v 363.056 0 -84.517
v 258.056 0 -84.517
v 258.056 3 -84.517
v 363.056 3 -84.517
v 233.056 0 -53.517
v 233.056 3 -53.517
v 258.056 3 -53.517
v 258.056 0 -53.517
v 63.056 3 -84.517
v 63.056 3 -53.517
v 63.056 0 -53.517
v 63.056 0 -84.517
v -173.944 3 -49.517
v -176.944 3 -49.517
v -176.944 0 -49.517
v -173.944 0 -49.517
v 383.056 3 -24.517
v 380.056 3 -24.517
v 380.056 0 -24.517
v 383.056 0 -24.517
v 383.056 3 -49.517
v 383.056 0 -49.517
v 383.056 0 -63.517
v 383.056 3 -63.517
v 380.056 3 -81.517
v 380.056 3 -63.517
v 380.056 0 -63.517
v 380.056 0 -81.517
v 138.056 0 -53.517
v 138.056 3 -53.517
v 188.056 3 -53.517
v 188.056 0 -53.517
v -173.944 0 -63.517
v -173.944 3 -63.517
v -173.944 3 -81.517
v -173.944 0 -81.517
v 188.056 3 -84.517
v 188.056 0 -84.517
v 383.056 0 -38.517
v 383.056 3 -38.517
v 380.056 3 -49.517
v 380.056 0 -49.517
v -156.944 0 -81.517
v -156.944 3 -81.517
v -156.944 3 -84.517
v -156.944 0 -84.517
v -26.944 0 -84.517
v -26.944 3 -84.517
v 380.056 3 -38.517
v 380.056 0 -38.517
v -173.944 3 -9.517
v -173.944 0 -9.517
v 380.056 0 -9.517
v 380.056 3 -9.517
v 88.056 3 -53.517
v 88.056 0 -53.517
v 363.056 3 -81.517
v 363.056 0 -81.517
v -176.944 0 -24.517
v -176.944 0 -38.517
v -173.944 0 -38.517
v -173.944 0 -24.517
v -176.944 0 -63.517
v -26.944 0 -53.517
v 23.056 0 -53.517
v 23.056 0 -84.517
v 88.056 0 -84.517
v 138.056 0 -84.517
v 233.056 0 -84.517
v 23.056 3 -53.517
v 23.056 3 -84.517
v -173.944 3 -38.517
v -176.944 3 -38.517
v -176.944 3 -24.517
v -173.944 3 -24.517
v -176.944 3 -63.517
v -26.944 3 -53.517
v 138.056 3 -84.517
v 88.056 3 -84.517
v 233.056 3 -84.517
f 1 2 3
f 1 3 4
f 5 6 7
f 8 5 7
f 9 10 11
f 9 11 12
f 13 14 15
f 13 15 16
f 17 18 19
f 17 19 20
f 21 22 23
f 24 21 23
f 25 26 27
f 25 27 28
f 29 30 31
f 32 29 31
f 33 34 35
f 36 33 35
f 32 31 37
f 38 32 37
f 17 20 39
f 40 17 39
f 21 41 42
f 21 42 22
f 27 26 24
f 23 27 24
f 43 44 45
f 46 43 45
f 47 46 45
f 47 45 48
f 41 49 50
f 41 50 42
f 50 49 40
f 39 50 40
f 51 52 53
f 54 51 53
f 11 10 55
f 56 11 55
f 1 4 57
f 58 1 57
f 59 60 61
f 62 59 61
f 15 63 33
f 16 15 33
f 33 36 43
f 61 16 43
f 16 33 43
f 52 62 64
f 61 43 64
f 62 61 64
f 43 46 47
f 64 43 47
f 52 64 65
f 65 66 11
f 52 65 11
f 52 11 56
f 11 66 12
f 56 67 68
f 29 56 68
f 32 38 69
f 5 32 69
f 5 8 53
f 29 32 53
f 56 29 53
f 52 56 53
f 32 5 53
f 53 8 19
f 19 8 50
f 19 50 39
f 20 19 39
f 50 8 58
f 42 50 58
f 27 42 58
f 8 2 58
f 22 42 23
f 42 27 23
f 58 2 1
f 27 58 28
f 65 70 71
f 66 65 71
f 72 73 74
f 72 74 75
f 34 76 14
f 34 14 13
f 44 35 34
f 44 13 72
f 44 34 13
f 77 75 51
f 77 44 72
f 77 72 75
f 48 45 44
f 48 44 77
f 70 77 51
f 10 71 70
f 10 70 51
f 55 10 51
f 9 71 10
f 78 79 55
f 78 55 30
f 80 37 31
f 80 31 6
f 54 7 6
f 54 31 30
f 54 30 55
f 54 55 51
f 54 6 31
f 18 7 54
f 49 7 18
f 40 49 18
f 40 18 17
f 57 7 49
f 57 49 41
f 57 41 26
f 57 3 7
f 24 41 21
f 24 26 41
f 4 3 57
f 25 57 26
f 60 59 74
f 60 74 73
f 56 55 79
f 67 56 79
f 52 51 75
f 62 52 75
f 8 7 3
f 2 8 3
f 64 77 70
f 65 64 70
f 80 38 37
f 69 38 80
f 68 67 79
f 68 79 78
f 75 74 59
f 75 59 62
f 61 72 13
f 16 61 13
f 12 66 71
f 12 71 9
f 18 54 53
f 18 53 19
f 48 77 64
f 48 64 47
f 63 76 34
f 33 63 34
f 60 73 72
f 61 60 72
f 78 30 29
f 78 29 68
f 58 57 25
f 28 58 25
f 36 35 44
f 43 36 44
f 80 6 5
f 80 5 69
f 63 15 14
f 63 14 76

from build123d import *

# Parameters (mm, degrees)
SKETCH1_W           = 560
SKETCH1_H           = 75
BOSS_EXTRUDE1_DEPTH = 3
SKETCH2_W           = 50
SKETCH2_H           = 31
SKETCH2_W_2         = 25
CUT_EXTRUDE2_DEPTH  = 3
SKETCH3_W           = 20
SKETCH3_H           = 3
CUT_EXTRUDE3_DEPTH  = 3
SKETCH7_W           = 3
SKETCH7_H           = 15
SKETCH7_H_2         = 11
SKETCH7_H_3         = 18
CUT_EXTRUDE8_DEPTH  = 10


with BuildPart() as part:
    # Sketch1 → Boss-Extrude1 (new body)
    with BuildSketch(Plane(origin=(0, 0, 0), x_dir=(1, 0, 0), z_dir=(0, 1, 0))):
        with Locations((103.055832565, 47.017453799)):
            Rectangle(SKETCH1_W, SKETCH1_H)
    extrude(amount=BOSS_EXTRUDE1_DEPTH)

    # Sketch2 → Cut-Extrude2 (cut)
    with BuildSketch(Plane(origin=(0, 3, 0), x_dir=(1, 0, 0), z_dir=(0, 1, 0))):
        with Locations((-1.944167435, 69.017453799)):
            Rectangle(SKETCH2_W, SKETCH2_H)
        with Locations((75.555832565, 69.017453799)):
            Rectangle(SKETCH2_W_2, SKETCH2_H)
        with Locations((163.055832565, 69.017453799)):
            Rectangle(SKETCH2_W, SKETCH2_H)
        with Locations((245.555832565, 69.017453799)):
            Rectangle(SKETCH2_W_2, SKETCH2_H)
    extrude(amount=-CUT_EXTRUDE2_DEPTH, mode=Mode.SUBTRACT)

    # Sketch3 → Cut-Extrude3 (cut)
    with BuildSketch(Plane(origin=(0, 3, 0), x_dir=(1, 0, 0), z_dir=(0, 1, 0))):
        with Locations((-166.944167435, 83.017453799)):
            Rectangle(SKETCH3_W, SKETCH3_H)
    extrude(amount=-CUT_EXTRUDE3_DEPTH, mode=Mode.SUBTRACT)

    # Sketch7 → Cut-Extrude8 (cut)
    with BuildSketch(Plane(origin=(0, 3, 0), x_dir=(1, 0, 0), z_dir=(0, 1, 0))):
        with Locations((-175.444167435, 17.017453799)):
            Rectangle(SKETCH7_W, SKETCH7_H)
        with Locations((-175.444167435, 44.017453799)):
            Rectangle(SKETCH7_W, SKETCH7_H_2)
        with Locations((-175.444167435, 72.517453799)):
            Rectangle(SKETCH7_W, SKETCH7_H_3)
        with Locations((381.555832565, 17.017453799)):
            Rectangle(SKETCH7_W, SKETCH7_H)
        with Locations((381.555832565, 44.017453799)):
            Rectangle(SKETCH7_W, SKETCH7_H_2)
        with Locations((381.555832565, 72.517453799)):
            Rectangle(SKETCH7_W, SKETCH7_H_3)
        Polygon((383.055832565, 81.517453799), (383.055832565, 84.517453799), (363.055832565, 84.517453799), (363.055832565, 81.517453799), (380.055832565, 81.517453799), align=None)
    extrude(amount=-CUT_EXTRUDE8_DEPTH, mode=Mode.SUBTRACT)


solid = part.part
